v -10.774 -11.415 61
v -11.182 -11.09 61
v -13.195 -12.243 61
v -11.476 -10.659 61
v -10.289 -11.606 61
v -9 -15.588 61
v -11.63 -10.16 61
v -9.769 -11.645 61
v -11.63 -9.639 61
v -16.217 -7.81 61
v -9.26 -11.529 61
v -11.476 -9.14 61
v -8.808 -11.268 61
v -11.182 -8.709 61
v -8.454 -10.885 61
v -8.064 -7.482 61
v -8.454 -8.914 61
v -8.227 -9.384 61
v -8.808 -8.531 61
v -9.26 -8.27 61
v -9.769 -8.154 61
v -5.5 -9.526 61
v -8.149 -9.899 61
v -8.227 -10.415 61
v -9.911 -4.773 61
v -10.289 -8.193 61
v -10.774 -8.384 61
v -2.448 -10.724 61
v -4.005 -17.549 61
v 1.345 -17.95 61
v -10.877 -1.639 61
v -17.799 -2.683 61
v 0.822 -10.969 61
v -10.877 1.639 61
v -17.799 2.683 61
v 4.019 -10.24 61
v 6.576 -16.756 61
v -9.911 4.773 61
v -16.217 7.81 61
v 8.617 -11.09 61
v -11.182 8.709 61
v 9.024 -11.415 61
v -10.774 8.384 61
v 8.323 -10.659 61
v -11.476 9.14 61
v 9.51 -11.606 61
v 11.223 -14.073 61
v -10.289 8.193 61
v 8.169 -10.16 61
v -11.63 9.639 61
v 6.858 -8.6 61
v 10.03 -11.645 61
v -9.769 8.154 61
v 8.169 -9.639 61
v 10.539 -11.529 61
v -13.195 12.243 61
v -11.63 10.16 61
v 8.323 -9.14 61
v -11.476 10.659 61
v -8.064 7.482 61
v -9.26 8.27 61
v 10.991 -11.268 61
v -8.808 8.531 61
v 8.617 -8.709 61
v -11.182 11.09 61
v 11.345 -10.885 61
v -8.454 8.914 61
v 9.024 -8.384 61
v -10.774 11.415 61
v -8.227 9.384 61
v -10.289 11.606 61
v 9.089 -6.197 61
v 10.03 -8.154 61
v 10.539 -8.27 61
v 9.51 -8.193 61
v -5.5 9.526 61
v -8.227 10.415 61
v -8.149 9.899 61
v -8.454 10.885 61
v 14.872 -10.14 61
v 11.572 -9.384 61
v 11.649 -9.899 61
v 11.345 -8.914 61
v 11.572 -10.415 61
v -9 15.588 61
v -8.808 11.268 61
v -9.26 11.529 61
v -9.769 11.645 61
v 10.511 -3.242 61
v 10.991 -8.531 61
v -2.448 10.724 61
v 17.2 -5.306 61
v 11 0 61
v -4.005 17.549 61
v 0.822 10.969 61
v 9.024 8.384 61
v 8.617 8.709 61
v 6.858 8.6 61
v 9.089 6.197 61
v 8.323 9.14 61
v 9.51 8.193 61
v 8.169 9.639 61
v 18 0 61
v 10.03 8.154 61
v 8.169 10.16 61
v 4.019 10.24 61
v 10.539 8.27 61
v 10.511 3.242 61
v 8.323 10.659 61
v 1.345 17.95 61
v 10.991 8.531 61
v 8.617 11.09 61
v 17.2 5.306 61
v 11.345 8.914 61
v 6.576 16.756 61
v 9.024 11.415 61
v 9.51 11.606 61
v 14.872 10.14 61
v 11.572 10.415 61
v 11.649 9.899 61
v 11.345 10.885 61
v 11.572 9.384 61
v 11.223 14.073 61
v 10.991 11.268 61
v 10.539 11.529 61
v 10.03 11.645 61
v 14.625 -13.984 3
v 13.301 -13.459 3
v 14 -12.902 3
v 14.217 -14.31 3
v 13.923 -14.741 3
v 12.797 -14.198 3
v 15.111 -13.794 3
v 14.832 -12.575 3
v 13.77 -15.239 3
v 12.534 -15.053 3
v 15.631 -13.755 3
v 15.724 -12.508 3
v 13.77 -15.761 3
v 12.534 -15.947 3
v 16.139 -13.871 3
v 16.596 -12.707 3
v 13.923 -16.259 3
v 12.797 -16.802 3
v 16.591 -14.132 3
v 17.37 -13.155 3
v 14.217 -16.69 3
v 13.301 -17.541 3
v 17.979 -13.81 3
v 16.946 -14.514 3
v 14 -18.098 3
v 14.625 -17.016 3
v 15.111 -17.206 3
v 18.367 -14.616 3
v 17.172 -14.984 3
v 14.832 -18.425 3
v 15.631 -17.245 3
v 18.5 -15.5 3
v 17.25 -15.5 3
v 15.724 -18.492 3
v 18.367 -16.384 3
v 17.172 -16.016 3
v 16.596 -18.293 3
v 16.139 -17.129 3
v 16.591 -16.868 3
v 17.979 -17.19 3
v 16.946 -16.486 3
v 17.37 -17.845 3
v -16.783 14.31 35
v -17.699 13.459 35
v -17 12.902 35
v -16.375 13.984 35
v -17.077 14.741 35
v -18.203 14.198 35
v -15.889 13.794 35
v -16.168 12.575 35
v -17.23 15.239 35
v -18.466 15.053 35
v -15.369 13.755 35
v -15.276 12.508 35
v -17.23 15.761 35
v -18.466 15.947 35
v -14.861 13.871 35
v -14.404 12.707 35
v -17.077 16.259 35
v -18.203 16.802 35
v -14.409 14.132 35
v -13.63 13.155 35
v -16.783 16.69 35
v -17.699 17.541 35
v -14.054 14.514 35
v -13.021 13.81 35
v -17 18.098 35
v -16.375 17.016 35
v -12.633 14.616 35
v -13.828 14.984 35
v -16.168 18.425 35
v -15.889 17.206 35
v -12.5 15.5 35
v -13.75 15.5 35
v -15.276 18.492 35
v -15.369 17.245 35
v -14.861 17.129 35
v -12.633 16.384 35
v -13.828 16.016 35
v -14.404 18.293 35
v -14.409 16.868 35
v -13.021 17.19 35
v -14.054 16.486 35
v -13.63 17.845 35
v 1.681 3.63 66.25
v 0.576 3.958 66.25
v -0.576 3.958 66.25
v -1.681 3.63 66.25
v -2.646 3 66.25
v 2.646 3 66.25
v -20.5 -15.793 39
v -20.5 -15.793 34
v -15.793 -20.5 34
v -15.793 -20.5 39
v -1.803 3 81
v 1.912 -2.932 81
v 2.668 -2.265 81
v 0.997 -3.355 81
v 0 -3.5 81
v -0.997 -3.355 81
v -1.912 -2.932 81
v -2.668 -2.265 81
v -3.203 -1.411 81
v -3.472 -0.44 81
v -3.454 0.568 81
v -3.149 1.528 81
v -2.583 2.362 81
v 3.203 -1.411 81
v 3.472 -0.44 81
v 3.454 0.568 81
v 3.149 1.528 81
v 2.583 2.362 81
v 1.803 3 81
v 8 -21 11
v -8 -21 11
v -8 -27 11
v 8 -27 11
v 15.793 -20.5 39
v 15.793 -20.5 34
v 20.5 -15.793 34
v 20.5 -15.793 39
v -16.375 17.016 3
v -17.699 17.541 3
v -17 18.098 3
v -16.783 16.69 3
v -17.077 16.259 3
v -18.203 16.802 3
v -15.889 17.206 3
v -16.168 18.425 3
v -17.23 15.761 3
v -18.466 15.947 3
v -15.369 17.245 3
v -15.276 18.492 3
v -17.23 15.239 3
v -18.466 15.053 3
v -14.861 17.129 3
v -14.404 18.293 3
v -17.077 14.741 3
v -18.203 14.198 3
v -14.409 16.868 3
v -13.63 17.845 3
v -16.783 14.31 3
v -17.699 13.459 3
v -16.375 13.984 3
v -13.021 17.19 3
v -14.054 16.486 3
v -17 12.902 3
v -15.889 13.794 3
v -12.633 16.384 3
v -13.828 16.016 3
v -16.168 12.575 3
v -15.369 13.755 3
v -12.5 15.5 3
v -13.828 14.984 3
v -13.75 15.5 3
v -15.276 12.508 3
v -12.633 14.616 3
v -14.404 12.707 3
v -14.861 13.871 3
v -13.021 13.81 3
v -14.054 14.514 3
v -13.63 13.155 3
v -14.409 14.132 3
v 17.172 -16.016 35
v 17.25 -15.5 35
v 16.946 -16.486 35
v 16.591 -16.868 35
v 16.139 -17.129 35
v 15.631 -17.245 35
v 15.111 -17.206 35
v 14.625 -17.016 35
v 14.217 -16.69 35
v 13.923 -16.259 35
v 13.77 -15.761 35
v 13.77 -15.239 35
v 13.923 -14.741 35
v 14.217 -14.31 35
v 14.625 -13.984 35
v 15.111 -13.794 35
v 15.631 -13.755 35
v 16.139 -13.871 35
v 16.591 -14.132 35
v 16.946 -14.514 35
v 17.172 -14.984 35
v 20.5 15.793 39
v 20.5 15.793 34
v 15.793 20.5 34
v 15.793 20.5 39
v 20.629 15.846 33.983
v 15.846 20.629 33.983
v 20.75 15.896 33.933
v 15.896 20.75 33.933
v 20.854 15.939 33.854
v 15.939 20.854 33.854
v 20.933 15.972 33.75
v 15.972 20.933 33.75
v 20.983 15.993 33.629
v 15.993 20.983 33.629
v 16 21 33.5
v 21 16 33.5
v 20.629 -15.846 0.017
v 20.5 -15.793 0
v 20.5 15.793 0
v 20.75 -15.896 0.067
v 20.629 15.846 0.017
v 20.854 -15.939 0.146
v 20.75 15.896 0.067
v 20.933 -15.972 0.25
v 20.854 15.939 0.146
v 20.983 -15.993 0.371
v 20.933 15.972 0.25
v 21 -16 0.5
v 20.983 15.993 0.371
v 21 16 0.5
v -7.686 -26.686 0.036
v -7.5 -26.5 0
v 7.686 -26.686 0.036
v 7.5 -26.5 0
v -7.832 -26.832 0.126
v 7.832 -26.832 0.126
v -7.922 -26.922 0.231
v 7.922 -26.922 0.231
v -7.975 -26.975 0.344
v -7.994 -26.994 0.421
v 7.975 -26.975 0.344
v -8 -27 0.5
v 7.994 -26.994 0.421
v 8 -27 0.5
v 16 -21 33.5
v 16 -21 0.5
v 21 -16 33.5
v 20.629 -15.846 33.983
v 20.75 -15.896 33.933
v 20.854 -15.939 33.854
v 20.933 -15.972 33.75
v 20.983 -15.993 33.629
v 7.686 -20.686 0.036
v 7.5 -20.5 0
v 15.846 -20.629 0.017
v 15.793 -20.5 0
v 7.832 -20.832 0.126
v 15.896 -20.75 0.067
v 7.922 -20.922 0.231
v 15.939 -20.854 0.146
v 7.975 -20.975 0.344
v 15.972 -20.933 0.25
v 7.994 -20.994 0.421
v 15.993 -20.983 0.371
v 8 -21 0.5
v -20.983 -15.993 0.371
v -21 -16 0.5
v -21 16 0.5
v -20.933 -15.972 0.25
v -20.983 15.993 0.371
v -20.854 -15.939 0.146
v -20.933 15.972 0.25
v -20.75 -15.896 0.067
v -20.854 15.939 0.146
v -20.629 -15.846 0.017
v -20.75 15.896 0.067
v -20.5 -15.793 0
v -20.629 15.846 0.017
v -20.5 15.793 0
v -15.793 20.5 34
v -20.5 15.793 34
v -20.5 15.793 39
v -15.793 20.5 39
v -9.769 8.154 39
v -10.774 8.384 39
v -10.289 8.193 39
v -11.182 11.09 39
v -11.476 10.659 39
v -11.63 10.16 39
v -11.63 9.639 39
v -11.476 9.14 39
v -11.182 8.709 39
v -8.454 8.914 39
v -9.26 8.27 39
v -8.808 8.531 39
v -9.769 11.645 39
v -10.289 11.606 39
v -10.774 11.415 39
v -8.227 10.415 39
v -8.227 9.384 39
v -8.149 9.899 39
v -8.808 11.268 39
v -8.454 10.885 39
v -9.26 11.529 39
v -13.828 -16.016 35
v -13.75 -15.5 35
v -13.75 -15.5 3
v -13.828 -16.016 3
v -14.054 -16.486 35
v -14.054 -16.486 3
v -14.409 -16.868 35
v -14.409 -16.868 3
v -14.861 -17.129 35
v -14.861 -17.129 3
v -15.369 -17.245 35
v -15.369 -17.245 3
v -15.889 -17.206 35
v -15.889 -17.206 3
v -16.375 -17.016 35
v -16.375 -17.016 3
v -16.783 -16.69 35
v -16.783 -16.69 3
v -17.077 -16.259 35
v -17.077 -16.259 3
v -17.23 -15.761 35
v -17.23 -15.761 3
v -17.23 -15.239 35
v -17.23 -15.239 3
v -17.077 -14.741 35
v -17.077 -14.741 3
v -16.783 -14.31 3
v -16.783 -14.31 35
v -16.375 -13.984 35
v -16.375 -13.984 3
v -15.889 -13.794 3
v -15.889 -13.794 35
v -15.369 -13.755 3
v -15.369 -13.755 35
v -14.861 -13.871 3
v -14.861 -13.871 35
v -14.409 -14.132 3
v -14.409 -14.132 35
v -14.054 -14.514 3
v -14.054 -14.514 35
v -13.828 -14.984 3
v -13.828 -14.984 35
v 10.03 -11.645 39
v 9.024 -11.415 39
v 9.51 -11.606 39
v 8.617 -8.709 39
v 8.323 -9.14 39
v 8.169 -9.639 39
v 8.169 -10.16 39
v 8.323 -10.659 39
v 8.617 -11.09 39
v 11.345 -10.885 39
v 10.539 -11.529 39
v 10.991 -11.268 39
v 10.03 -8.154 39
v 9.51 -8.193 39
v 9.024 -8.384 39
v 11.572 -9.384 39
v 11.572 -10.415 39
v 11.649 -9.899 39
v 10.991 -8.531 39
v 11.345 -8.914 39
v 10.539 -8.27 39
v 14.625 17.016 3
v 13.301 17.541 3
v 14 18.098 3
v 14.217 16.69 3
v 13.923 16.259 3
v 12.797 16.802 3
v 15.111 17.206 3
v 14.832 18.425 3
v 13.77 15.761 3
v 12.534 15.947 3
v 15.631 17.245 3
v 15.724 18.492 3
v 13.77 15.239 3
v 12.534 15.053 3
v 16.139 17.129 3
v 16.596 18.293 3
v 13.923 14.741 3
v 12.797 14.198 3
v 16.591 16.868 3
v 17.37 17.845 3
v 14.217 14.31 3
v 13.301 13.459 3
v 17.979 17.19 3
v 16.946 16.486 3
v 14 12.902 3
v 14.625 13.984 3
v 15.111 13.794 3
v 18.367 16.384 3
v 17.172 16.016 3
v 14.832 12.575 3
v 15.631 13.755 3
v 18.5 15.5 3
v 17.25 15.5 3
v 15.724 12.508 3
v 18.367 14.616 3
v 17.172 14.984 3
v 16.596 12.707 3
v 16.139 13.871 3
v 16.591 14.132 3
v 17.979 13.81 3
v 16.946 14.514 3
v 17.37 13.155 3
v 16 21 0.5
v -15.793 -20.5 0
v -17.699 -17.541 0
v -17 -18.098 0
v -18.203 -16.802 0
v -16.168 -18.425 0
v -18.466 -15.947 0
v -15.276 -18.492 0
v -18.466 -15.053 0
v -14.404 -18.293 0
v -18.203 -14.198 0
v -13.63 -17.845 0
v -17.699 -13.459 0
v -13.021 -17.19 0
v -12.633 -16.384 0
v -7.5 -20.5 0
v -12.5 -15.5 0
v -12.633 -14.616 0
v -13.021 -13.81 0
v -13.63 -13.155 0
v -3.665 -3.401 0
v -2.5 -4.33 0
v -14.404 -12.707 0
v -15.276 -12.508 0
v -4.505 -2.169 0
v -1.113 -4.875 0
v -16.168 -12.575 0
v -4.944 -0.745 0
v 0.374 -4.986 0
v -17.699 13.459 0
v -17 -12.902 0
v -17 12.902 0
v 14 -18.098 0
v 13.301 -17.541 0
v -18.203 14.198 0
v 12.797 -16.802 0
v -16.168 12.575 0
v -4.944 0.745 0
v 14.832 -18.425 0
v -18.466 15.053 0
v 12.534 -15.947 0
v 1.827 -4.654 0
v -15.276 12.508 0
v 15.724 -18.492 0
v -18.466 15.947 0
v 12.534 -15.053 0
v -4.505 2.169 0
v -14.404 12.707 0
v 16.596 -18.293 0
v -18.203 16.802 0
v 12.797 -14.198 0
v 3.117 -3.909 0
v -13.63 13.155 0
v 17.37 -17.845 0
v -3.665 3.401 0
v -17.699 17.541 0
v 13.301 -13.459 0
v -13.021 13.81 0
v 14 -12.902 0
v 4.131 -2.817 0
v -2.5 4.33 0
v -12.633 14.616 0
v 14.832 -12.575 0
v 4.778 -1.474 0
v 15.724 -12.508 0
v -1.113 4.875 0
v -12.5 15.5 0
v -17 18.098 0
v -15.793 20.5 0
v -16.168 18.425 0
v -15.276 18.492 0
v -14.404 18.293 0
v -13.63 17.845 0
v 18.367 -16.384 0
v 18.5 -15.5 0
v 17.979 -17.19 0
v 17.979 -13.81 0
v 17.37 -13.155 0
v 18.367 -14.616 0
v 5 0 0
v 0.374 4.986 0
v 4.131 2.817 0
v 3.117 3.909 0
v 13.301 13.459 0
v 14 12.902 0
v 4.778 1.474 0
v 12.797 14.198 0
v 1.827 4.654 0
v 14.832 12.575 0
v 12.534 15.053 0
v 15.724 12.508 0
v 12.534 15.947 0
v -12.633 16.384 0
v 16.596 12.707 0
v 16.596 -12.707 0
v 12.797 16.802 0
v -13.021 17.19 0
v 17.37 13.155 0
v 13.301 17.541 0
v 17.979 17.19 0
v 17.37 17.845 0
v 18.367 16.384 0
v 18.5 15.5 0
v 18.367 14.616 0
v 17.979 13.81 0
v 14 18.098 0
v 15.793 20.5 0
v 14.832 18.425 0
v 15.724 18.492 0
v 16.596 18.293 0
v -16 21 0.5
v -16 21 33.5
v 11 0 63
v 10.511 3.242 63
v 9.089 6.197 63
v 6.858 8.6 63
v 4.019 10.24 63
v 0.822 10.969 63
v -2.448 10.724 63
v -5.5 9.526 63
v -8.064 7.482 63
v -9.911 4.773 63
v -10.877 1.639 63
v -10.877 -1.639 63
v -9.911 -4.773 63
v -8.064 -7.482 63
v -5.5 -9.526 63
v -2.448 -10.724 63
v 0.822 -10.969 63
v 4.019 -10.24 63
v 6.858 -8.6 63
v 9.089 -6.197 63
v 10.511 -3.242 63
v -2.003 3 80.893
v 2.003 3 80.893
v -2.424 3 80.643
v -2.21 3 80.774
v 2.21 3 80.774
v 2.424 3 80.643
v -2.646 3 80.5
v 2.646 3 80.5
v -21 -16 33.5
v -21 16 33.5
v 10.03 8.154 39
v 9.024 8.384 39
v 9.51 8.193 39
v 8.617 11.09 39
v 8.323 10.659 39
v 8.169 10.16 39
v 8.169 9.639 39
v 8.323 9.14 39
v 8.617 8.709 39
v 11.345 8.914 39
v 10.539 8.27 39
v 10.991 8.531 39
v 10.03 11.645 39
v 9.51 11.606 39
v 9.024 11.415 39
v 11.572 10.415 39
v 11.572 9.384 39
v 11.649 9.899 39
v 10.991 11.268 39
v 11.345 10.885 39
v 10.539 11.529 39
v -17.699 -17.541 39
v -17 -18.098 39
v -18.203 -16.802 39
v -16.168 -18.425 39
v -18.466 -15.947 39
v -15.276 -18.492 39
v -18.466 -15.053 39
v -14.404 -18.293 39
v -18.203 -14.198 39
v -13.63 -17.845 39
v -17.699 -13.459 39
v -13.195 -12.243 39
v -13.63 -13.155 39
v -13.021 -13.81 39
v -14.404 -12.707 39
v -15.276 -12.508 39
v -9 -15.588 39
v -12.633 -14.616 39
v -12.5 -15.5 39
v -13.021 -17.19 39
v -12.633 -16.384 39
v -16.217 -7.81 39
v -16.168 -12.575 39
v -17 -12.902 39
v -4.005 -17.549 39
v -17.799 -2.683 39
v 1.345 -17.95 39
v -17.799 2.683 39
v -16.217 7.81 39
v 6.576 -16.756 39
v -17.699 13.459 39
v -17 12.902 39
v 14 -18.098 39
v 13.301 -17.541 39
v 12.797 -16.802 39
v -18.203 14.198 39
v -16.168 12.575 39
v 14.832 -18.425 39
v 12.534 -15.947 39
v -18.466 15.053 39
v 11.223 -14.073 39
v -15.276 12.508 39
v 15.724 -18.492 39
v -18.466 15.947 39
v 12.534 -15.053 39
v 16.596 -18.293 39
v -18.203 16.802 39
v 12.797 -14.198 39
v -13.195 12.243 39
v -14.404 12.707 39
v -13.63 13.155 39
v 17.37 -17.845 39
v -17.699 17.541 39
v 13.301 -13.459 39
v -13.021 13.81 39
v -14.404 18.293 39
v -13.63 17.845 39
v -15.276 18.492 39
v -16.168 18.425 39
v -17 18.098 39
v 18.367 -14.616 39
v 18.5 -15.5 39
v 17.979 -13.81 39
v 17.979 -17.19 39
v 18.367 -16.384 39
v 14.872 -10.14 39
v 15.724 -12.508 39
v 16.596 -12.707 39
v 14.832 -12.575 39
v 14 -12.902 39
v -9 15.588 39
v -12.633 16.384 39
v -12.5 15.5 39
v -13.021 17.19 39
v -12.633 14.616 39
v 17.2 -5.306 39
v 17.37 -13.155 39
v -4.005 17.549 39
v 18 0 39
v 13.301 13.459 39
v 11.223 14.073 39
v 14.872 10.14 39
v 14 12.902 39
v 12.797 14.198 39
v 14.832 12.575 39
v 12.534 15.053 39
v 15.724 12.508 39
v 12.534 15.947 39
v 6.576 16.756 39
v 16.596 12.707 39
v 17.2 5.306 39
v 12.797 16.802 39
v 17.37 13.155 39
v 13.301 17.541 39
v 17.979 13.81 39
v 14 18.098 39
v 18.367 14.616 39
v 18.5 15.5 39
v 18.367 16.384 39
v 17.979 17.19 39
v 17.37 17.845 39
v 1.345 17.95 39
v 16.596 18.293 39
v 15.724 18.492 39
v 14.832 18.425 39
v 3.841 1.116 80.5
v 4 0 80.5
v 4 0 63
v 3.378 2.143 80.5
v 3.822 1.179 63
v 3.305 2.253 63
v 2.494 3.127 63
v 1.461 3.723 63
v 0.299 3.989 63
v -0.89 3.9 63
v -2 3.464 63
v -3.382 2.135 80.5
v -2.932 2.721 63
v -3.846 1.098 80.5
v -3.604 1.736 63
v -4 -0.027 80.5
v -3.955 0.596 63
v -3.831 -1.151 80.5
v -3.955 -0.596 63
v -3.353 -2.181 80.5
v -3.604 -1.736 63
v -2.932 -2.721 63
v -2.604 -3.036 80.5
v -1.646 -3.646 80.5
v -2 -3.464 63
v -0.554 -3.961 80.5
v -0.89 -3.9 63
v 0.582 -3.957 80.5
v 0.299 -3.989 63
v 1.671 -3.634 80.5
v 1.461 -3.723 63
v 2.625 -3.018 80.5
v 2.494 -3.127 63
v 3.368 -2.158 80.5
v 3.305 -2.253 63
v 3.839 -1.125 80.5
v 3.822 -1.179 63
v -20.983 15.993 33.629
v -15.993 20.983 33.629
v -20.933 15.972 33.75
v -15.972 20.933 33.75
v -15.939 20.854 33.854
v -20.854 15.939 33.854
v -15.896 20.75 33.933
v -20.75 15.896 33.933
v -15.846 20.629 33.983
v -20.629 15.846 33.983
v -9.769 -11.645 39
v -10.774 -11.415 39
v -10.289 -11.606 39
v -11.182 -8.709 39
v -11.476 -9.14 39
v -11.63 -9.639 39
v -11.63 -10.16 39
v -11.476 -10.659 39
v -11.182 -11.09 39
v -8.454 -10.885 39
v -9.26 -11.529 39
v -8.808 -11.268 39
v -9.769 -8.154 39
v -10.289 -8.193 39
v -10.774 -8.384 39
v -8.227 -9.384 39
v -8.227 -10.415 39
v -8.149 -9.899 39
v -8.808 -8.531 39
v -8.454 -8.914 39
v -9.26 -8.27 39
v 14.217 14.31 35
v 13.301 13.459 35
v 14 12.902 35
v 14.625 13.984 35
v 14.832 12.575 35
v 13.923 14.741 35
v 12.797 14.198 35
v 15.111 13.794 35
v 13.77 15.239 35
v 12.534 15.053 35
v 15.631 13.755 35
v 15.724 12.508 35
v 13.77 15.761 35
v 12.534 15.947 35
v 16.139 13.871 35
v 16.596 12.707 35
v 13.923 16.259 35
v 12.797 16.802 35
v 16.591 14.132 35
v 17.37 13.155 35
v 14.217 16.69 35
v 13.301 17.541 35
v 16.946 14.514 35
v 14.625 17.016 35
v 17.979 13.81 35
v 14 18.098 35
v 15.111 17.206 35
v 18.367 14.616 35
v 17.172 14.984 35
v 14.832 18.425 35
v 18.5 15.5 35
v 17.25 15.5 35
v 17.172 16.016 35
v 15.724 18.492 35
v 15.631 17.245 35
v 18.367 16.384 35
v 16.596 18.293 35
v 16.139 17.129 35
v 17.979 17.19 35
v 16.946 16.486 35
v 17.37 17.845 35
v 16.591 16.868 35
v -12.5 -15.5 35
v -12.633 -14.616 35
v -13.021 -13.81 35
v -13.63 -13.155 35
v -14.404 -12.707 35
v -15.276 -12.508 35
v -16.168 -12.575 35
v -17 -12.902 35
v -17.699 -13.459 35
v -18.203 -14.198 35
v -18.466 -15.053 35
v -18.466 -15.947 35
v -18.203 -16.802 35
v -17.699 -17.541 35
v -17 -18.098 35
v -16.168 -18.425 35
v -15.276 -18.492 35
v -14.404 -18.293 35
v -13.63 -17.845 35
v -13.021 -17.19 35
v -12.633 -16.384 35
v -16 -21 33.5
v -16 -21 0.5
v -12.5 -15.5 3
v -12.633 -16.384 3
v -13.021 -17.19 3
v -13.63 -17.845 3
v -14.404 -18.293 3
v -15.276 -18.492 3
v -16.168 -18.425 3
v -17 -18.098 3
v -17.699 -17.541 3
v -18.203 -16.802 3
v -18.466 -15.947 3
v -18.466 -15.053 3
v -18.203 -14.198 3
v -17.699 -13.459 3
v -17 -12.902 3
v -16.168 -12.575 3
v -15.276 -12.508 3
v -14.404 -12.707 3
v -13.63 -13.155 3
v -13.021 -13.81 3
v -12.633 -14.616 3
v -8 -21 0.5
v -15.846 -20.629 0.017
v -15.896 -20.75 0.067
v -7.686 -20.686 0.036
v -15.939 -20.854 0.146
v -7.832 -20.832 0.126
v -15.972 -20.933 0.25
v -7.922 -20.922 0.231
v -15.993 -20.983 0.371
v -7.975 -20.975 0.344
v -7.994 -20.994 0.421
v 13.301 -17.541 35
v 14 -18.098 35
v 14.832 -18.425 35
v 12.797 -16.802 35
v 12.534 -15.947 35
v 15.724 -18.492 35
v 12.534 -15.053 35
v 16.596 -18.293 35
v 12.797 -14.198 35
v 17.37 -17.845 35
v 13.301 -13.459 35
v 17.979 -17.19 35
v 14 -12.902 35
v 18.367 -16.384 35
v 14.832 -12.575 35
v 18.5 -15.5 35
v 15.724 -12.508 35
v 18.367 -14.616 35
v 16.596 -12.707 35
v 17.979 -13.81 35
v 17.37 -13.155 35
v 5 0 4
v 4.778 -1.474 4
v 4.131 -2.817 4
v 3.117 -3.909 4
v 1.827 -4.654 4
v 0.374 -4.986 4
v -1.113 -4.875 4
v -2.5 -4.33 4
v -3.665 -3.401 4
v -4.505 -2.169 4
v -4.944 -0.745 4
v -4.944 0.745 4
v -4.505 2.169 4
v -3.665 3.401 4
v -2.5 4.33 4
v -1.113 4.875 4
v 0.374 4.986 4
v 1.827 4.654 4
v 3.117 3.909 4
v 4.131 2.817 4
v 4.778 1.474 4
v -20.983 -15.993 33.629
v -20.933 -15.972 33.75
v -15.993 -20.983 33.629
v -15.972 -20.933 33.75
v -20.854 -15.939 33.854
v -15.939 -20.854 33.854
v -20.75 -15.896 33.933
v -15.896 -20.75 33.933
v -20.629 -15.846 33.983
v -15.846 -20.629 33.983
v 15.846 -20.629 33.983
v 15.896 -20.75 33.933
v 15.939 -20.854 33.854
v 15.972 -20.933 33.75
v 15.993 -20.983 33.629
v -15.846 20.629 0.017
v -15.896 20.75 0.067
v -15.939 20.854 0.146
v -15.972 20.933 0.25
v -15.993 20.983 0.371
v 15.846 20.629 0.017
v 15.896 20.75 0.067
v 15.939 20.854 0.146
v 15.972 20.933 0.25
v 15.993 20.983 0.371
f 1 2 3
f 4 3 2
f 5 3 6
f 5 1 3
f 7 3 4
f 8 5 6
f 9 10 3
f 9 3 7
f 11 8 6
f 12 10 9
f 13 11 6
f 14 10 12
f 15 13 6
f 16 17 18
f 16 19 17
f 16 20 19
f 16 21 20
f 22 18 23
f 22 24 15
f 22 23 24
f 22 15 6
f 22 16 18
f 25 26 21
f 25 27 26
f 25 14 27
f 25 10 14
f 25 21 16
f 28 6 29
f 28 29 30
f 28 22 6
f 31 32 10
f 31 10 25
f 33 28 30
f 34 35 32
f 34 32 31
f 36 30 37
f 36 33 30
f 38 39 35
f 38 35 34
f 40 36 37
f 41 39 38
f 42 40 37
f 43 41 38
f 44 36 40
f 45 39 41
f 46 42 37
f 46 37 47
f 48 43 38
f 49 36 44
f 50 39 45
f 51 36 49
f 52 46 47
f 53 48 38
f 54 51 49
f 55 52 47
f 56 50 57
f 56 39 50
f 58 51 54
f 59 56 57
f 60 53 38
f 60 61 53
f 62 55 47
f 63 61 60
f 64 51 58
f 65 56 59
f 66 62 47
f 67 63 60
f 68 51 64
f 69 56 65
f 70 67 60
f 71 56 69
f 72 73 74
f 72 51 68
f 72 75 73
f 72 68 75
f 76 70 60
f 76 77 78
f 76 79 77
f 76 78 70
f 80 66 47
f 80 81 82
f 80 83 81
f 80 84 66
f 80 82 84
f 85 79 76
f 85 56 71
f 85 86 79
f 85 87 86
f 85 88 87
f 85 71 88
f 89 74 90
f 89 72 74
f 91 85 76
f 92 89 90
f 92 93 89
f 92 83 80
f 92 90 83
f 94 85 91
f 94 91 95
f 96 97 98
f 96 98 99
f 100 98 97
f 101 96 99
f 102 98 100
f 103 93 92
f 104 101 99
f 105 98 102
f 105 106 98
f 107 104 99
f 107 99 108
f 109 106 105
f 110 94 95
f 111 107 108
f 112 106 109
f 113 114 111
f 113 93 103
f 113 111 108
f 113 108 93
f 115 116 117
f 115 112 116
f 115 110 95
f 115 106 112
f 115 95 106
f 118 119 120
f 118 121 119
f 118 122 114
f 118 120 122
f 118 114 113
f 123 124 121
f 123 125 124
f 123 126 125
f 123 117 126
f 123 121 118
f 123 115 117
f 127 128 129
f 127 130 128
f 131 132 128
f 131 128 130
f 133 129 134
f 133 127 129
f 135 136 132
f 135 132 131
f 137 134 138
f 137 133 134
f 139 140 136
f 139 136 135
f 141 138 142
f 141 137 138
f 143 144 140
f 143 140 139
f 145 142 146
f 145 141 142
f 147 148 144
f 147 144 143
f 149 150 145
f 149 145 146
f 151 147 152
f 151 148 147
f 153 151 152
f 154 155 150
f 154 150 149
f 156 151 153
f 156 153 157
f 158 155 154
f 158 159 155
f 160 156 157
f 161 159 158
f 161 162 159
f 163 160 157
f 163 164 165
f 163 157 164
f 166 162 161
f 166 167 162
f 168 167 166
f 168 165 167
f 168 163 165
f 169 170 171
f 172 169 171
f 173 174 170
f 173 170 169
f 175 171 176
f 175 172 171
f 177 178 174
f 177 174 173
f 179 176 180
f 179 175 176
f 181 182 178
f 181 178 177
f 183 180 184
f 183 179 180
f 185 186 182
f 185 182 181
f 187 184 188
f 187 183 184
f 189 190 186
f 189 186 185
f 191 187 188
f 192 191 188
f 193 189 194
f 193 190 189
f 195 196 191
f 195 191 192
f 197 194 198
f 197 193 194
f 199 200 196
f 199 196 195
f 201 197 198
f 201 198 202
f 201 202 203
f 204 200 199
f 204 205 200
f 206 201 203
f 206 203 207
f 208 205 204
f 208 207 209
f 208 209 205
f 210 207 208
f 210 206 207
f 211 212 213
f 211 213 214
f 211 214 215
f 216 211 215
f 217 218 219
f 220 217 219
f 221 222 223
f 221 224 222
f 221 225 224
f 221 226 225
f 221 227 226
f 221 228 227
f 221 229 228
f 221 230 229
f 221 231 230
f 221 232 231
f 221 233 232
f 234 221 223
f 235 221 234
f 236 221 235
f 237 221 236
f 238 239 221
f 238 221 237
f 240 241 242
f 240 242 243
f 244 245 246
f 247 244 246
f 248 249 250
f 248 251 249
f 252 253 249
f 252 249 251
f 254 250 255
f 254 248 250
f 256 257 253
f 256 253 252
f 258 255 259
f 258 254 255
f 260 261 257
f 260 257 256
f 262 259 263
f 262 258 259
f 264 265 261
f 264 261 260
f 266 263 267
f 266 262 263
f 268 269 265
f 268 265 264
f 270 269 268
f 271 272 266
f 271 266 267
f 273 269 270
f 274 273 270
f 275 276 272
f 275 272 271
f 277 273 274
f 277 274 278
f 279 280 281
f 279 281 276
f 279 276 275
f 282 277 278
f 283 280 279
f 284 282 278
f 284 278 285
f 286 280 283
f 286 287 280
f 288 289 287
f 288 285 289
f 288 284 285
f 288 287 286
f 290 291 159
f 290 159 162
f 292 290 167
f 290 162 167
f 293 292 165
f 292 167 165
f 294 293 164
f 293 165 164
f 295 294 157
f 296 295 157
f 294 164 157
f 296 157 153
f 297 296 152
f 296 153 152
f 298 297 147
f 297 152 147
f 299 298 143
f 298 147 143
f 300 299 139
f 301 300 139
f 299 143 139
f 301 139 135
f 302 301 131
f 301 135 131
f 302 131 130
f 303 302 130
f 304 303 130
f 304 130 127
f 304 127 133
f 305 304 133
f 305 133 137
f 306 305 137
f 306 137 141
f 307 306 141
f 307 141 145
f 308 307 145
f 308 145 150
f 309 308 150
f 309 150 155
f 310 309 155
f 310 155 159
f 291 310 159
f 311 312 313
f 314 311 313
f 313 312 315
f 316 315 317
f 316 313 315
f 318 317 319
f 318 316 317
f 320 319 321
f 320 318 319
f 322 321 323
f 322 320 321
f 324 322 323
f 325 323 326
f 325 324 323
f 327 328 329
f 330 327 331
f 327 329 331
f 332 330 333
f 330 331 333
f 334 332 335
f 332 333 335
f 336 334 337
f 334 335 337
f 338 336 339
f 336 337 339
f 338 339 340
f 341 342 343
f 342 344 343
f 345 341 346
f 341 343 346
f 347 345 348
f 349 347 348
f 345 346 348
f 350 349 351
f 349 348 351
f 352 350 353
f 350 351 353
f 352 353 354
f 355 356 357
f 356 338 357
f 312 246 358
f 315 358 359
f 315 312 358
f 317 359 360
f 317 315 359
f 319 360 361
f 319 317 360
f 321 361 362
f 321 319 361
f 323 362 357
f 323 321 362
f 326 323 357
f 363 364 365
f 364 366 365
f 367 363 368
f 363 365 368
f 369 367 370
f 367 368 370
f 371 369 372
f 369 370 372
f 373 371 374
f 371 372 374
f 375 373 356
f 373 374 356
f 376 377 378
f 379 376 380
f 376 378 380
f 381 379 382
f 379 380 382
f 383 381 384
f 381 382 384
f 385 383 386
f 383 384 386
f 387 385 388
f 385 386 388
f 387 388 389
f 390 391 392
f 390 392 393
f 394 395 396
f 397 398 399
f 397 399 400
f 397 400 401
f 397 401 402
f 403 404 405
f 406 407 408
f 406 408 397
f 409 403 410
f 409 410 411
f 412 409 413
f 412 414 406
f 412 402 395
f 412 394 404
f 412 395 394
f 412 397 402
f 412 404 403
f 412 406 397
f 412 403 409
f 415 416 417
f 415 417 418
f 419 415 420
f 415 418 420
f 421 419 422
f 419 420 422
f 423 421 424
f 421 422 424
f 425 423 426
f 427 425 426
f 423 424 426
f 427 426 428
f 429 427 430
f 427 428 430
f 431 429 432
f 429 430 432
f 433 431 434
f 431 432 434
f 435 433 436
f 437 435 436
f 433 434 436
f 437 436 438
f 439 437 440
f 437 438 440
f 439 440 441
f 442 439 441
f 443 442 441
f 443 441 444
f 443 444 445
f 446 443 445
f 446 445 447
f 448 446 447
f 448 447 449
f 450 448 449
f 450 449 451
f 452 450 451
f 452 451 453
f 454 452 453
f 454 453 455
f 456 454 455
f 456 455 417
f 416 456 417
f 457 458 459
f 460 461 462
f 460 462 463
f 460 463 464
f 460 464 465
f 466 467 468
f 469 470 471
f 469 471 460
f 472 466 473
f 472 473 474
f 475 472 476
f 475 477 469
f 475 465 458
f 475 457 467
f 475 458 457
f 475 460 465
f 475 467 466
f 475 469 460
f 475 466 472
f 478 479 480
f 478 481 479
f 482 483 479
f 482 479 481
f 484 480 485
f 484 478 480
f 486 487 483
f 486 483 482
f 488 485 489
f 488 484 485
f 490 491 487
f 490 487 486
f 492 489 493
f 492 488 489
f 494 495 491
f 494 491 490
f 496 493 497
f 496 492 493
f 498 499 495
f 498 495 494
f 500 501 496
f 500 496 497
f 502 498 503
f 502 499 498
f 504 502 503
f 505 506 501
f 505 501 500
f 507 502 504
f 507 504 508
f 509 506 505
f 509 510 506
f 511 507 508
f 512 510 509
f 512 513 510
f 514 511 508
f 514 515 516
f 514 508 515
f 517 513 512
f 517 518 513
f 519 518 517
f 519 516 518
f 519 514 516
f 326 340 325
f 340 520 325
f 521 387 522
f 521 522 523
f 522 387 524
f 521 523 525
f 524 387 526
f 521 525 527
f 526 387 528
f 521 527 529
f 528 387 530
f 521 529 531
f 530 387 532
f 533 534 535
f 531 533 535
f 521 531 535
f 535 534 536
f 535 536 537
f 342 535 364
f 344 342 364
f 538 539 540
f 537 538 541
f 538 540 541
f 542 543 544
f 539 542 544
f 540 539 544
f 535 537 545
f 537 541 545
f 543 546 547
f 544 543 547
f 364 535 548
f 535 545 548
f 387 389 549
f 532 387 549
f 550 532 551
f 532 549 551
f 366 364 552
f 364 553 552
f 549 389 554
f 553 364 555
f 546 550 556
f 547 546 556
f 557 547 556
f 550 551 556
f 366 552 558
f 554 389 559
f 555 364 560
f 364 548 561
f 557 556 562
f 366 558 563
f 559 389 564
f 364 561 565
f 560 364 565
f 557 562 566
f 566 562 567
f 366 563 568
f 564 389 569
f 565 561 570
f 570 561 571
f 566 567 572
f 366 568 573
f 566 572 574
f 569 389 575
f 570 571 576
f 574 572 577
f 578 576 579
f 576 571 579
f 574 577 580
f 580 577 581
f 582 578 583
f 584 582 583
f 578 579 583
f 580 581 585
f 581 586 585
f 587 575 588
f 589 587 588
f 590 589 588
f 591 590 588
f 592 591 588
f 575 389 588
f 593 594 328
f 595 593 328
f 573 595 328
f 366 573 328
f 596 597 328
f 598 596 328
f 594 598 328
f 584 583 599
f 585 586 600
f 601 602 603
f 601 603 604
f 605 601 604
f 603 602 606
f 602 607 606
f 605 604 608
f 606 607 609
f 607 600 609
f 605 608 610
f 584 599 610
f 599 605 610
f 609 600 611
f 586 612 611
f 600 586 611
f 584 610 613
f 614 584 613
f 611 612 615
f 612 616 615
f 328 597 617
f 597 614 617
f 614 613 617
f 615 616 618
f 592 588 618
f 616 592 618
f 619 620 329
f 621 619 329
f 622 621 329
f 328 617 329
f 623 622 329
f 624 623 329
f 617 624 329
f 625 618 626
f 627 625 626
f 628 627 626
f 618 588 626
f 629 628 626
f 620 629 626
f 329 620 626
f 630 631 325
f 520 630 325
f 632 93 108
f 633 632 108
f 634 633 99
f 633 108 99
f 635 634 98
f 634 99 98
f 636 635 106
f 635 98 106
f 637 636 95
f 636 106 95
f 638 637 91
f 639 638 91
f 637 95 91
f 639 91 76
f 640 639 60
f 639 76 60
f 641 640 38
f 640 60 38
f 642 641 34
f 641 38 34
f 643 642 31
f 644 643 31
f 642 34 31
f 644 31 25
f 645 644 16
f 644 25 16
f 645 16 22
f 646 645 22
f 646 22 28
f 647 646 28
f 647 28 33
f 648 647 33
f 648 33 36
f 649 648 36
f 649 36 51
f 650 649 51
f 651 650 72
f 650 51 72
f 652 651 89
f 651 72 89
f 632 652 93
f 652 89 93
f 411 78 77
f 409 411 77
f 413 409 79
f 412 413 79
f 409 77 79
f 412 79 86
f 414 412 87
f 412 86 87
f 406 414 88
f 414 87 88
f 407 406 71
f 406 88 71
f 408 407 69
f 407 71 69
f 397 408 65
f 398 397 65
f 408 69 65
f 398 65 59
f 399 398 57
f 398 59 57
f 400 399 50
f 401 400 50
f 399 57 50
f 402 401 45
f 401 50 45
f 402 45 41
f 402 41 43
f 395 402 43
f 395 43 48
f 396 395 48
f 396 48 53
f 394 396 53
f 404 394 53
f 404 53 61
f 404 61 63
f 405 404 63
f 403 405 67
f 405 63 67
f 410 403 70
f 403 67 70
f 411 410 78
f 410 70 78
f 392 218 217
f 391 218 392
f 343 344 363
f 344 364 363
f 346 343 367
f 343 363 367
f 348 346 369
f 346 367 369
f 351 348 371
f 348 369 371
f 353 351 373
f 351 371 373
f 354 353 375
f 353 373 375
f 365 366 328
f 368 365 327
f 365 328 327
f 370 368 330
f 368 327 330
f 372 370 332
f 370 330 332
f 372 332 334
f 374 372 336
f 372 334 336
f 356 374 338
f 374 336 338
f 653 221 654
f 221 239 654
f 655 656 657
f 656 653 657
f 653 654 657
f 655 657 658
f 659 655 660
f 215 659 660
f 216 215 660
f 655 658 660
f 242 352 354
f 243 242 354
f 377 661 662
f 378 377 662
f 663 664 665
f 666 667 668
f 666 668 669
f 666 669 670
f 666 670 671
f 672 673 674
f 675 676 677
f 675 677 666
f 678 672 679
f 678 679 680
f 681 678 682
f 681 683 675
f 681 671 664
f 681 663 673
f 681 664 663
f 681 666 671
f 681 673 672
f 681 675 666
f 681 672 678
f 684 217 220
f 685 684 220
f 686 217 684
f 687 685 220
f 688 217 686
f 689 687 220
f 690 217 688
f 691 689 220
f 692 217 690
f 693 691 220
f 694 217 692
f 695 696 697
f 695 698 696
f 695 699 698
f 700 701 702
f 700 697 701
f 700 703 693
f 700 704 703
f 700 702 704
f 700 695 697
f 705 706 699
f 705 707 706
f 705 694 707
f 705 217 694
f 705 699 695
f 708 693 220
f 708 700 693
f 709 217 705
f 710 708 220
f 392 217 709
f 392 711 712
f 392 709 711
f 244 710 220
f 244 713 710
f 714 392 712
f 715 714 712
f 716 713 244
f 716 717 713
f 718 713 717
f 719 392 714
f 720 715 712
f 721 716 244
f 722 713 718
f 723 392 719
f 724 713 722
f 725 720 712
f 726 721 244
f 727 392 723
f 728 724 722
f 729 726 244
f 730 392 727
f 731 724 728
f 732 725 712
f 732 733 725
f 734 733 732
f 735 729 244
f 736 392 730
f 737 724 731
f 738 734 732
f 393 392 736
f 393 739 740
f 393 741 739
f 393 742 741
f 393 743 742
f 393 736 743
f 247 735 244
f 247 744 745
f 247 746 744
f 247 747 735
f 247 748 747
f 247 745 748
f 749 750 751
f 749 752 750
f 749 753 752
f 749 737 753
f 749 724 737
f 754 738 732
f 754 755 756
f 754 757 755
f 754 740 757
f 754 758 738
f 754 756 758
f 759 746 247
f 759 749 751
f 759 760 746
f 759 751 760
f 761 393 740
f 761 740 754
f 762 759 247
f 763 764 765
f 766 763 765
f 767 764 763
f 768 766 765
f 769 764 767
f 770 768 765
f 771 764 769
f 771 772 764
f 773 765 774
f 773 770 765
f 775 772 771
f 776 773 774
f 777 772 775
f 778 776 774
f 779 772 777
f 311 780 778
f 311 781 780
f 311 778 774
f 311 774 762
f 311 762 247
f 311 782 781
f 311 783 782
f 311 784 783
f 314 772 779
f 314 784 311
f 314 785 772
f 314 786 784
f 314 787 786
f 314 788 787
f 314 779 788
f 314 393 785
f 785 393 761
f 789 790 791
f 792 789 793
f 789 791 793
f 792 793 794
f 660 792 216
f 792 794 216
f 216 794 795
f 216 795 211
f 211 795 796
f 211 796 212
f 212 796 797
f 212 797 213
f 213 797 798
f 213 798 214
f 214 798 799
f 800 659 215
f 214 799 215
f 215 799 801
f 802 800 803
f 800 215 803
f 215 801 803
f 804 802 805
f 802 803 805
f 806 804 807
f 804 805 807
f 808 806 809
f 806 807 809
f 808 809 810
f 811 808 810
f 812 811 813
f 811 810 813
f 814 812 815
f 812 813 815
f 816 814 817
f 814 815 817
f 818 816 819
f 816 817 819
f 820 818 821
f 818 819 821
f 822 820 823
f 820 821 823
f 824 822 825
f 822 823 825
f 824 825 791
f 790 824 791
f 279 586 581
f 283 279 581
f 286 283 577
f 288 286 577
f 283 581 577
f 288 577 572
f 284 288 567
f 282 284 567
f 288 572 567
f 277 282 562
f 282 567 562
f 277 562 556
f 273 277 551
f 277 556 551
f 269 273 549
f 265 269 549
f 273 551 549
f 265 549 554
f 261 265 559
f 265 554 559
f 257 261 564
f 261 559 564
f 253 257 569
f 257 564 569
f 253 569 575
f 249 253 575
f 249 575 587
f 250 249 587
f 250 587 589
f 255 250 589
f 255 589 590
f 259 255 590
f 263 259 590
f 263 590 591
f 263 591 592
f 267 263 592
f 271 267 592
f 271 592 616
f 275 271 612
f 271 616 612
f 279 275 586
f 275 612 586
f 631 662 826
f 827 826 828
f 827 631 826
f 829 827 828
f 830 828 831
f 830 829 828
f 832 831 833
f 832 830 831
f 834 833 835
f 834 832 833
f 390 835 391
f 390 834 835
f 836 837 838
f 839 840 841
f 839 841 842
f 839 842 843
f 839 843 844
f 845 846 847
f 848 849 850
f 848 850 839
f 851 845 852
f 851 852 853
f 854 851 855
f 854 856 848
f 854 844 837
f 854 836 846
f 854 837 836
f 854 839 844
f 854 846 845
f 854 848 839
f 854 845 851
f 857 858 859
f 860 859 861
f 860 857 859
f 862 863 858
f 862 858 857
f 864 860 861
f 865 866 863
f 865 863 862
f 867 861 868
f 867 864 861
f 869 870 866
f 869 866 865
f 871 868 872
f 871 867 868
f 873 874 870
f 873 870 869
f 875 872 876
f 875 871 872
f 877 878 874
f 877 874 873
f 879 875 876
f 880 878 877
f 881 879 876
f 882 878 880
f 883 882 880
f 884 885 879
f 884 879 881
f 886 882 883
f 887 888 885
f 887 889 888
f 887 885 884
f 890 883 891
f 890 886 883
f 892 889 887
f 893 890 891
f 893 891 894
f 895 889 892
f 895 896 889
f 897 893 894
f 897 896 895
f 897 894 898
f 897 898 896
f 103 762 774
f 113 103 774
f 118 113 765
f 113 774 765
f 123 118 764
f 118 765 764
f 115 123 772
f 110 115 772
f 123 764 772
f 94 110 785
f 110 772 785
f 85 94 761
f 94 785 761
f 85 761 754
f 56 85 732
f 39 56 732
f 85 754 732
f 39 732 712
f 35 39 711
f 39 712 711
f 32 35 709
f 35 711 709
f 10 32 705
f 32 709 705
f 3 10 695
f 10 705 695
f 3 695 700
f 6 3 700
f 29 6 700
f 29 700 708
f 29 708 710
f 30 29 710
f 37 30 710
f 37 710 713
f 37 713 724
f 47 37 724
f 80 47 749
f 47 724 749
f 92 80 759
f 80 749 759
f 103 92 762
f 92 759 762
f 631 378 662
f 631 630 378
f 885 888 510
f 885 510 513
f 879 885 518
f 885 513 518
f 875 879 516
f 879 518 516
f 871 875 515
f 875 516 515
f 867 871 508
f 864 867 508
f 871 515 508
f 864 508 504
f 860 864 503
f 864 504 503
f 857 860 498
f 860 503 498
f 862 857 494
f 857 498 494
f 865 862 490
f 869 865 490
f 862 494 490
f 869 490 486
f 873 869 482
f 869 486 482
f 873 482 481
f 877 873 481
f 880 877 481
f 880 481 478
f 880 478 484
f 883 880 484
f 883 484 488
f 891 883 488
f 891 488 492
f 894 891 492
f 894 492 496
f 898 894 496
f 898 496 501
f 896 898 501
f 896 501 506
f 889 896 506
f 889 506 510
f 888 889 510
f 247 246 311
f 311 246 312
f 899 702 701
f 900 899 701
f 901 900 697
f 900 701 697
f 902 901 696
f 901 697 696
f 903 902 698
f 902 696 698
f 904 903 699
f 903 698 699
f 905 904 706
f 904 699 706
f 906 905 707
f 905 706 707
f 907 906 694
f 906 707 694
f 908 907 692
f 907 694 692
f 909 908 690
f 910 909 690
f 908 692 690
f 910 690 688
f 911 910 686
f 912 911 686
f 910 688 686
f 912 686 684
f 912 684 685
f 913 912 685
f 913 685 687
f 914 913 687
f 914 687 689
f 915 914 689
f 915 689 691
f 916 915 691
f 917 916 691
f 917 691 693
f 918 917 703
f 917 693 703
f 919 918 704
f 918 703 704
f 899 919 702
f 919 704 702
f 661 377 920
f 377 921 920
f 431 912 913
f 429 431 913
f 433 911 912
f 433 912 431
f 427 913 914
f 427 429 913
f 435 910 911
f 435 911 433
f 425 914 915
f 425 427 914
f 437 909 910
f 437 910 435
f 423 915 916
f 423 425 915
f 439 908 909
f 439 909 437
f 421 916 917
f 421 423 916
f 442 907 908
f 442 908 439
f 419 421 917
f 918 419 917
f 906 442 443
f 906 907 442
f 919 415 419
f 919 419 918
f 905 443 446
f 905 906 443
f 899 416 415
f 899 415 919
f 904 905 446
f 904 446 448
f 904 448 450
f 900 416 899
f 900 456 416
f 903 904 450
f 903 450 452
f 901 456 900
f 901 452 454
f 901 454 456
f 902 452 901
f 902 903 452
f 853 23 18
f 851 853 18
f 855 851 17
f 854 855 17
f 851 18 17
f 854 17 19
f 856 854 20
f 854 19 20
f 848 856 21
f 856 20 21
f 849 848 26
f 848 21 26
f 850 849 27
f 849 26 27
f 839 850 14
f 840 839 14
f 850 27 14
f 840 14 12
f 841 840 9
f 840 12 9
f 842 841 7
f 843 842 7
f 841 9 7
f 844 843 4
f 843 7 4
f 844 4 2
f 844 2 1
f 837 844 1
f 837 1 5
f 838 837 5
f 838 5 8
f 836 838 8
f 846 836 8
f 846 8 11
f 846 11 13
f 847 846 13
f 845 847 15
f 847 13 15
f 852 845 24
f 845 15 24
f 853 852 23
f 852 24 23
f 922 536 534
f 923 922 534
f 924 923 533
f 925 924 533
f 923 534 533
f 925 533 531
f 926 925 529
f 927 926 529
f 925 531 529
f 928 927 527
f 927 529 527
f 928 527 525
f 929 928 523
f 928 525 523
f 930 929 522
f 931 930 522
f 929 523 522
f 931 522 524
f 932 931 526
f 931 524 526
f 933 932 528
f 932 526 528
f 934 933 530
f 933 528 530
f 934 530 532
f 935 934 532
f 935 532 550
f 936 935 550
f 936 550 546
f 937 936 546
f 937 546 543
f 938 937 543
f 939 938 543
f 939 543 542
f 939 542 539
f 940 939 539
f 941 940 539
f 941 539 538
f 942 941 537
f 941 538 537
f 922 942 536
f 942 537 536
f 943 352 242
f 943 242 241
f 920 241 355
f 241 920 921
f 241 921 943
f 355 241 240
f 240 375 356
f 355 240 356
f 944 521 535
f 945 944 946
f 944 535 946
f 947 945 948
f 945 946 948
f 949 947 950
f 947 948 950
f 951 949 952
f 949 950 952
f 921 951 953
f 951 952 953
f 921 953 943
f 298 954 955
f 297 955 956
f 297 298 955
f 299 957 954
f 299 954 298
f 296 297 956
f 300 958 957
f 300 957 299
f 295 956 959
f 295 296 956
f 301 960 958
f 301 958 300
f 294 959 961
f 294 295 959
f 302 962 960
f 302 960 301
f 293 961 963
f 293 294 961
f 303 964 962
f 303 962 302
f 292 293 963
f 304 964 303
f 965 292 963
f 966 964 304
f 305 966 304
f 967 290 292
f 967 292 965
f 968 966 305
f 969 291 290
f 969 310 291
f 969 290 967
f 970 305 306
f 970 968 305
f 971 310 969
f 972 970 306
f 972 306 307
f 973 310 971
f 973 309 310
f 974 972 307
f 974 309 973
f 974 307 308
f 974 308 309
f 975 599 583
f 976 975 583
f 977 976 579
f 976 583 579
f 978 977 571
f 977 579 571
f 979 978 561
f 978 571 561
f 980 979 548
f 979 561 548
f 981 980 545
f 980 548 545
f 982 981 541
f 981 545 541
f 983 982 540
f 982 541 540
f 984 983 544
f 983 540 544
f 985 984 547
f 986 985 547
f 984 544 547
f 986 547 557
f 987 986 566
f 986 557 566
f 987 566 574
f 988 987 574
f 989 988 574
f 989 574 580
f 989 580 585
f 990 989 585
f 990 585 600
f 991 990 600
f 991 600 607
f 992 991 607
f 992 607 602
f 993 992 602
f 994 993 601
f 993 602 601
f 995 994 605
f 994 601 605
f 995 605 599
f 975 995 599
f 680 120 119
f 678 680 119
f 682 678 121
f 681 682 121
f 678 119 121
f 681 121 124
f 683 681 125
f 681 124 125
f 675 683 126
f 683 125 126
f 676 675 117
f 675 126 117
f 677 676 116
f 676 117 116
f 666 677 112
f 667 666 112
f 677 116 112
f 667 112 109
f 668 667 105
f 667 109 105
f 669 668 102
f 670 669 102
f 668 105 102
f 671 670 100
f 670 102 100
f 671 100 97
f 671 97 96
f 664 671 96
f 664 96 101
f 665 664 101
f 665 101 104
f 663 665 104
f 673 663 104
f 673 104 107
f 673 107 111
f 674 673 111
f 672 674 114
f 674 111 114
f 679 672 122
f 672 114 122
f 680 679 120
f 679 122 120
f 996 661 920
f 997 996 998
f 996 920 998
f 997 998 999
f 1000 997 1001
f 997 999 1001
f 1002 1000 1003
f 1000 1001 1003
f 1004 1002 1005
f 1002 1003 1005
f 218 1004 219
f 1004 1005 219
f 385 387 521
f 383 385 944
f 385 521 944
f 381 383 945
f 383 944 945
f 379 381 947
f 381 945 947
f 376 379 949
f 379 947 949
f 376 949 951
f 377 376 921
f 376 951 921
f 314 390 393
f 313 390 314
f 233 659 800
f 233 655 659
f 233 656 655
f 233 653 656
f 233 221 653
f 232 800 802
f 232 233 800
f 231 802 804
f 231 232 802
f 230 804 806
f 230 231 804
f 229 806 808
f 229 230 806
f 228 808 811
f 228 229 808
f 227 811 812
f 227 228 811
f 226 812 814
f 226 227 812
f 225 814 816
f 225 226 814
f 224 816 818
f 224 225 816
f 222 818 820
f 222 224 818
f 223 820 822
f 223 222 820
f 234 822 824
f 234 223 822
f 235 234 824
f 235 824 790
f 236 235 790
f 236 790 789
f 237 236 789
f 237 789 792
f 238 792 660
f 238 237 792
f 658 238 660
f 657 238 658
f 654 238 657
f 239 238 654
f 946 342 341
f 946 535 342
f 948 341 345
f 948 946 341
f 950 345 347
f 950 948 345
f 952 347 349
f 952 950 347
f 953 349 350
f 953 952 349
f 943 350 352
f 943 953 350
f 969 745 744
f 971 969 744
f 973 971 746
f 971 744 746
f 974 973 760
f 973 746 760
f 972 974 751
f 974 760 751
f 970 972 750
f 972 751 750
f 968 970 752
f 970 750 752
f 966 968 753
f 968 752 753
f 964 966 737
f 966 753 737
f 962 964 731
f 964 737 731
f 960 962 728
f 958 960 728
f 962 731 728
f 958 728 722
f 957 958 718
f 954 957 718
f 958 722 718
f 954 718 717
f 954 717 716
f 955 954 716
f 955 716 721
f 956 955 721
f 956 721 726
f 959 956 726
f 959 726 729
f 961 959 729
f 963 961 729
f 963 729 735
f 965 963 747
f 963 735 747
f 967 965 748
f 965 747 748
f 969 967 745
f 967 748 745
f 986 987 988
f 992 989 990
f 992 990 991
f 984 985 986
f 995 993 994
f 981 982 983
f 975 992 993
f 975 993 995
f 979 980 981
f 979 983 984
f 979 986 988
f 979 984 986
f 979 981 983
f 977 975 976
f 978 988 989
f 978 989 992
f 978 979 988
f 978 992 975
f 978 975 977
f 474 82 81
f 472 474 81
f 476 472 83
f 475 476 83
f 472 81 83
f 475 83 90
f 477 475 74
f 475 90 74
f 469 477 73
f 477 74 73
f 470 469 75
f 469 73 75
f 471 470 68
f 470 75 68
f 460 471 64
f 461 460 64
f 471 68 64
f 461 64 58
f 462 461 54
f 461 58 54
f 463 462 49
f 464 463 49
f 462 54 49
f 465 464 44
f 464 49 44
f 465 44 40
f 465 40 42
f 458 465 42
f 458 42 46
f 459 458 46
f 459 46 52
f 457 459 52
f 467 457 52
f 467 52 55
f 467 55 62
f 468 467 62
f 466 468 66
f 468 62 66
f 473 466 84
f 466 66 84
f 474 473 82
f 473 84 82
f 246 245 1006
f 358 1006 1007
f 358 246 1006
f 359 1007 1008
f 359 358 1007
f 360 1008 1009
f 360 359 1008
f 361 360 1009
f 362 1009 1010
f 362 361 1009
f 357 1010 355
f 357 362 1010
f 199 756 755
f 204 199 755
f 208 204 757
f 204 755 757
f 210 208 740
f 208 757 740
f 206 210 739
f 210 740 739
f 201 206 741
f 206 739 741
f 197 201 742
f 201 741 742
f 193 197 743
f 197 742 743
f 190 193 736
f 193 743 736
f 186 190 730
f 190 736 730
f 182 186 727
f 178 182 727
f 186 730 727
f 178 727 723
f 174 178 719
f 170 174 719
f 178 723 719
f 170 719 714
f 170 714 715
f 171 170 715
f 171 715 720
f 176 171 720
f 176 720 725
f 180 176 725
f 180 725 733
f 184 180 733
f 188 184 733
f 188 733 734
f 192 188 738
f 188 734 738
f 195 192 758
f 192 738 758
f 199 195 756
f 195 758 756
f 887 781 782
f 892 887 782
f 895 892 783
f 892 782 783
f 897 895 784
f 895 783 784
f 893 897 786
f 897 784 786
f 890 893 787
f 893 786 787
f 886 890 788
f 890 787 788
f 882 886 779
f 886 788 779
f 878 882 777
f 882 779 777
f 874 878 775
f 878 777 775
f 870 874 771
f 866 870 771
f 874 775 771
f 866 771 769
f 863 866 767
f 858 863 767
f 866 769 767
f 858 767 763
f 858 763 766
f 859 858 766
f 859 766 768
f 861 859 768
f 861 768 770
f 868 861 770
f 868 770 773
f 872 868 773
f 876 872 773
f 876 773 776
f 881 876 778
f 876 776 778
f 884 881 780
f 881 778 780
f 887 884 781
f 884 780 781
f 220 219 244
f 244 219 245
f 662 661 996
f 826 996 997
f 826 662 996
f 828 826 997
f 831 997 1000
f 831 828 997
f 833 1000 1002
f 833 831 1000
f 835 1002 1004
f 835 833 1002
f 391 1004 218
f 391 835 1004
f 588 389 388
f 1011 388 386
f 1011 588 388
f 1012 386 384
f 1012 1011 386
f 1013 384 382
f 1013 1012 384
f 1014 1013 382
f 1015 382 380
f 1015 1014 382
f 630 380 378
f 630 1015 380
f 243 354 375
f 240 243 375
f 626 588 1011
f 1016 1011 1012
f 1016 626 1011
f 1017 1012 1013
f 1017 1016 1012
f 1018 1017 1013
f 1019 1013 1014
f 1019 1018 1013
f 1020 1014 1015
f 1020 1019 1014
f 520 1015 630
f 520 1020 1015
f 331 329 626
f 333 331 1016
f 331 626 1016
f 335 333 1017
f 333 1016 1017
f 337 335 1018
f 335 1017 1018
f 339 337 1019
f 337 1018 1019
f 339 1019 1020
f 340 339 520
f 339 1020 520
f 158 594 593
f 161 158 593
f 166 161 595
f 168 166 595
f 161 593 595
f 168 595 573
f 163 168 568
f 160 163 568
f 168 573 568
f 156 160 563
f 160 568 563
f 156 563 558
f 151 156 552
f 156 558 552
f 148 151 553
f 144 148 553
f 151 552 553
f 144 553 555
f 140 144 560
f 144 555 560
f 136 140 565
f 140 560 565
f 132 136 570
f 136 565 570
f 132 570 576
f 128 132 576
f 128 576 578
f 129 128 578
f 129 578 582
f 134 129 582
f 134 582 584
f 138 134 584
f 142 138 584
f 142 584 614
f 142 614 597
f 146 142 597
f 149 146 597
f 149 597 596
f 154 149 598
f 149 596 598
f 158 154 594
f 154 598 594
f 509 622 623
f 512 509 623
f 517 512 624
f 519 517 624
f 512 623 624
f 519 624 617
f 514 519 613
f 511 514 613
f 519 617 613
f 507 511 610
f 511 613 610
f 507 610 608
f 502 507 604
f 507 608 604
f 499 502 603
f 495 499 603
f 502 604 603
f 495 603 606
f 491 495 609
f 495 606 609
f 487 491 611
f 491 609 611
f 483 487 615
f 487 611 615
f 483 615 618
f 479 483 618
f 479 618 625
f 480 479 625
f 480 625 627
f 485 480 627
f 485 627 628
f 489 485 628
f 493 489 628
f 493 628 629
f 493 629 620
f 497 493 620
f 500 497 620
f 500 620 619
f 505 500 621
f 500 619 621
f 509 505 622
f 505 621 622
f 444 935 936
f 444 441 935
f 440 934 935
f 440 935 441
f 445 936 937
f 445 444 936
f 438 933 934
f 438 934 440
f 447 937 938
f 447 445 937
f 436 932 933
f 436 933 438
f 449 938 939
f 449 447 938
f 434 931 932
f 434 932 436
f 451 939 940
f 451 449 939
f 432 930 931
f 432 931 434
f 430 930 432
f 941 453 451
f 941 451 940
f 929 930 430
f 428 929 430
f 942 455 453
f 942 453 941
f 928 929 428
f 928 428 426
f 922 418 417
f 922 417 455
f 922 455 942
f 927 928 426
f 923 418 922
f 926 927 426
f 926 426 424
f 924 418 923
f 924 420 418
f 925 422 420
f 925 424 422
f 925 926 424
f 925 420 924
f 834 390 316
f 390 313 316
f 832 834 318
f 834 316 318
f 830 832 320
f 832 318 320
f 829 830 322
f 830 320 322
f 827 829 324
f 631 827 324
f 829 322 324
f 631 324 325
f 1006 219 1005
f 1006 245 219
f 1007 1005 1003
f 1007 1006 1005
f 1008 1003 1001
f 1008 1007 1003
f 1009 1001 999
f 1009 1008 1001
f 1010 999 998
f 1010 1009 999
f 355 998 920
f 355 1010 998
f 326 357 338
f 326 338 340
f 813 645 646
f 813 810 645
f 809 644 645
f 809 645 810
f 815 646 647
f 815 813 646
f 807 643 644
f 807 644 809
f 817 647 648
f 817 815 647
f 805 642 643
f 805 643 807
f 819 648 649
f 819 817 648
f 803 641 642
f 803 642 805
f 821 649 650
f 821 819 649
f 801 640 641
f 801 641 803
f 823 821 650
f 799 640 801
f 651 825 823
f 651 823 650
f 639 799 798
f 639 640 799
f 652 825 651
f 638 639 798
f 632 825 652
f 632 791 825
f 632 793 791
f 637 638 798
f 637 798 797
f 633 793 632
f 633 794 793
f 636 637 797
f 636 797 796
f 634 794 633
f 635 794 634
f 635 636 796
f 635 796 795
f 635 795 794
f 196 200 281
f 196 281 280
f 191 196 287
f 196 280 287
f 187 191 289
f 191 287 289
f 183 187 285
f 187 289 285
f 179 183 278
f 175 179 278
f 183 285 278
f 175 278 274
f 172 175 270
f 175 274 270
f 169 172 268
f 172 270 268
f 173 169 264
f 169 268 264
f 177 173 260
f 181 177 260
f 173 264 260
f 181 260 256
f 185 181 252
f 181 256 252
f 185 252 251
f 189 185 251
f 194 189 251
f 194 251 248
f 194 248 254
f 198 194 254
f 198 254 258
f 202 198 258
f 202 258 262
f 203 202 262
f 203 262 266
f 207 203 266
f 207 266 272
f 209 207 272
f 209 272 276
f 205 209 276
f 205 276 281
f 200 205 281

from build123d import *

# Parameters (mm, degrees)
F0_W      = 42
F0_H      = 42
F1_DEPTH  = 34
F2_SIZE   = 5
F3_W      = 16
F3_H      = 6
F4_DEPTH  = 11
F5_R      = 0.5
F6_DEPTH  = 5
F7_R      = 1.75
F8_DEPTH  = 39.001
F9_R      = 3
F10_DEPTH = 4
F11_R     = 18
F12_DEPTH = 22
F13_R     = 11
F14_DEPTH = 2
F15_R     = 4
F16_DEPTH = 20
F17_SIZE  = 0.5
F19_DEPTH = 14.75
F20_R     = 1.75
F21_DEPTH = 22
F22_R     = 3
F23_DEPTH = 3
F24_R     = 5
F25_DEPTH = 4


with BuildPart() as f1:
    # F0 (on Top) → F1 (new body)
    with BuildSketch(Plane.XY):
        Rectangle(F0_W, F0_H)
    extrude(amount=F1_DEPTH)

    # F2
    f2_edges = [f1.edges().sort_by_distance(p)[0] for p in [
        (-21, -21, 17),
        (21, -21, 17),
        (21, 21, 17),
        (-21, 21, 17),
    ]]
    chamfer(f2_edges, length=F2_SIZE)

    # F3 (on Top) → F4 (join)
    with BuildSketch(Plane.XY):
        with Locations((0, -24)):
            Rectangle(F3_W, F3_H)
    extrude(amount=F4_DEPTH)

    # F5
    f5_edges = [f1.edges().sort_by_distance(p)[0] for p in [
        (21, 0, 34),
        (18.5, -18.5, 34),
        (18.5, 18.5, 34),
        (0, -21, 34),
        (0, 21, 34),
        (-18.5, -18.5, 34),
        (-18.5, 18.5, 34),
        (-21, 0, 34),
        (21, 0, 0),
        (18.5, 18.5, 0),
        (0, 21, 0),
        (-18.5, 18.5, 0),
        (-21, 0, 0),
        (-18.5, -18.5, 0),
        (-12, -21, 0),
        (-8, -24, 0),
        (0, -27, 0),
        (8, -24, 0),
        (12, -21, 0),
        (18.5, -18.5, 0),
    ]]
    fillet(f5_edges, radius=F5_R)

    # F6 (add): a face of the model
    f6_faces = [f1.faces().sort_by_distance(p)[0] for p in [
        (0, 0, 34),
    ]]
    extrude(f6_faces, amount=F6_DEPTH)

    # F7 (on face) → F8 (cut, through all)
    with BuildSketch(Plane(origin=(0, 0, 0), x_dir=(1, 0, 0), z_dir=(0, 0, -1))):
        with Locations((-15.5, 15.5)):
            Circle(F7_R)
        with Locations((-15.5, -15.5)):
            Circle(F7_R)
        with Locations((15.5, -15.5)):
            Circle(F7_R)
        with Locations((15.5, 15.5)):
            Circle(F7_R)
    extrude(amount=-F8_DEPTH, mode=Mode.SUBTRACT)

    # F9 (on face) → F10 (cut)
    with BuildSketch(Plane.XY.offset(39)):
        with Locations((-15.5, 15.5)):
            Circle(F9_R)
        with Locations((-15.5, -15.5)):
            Circle(F9_R)
        with Locations((15.5, -15.5)):
            Circle(F9_R)
        with Locations((15.5, 15.5)):
            Circle(F9_R)
    extrude(amount=-F10_DEPTH, mode=Mode.SUBTRACT)

    # F11 (on face) → F12 (join)
    with BuildSketch(Plane.XY.offset(39)):
        Circle(F11_R)
    extrude(amount=F12_DEPTH)

    # F13 (on face) → F14 (join)
    with BuildSketch(Plane.XY.offset(61)):
        Circle(F13_R)
    extrude(amount=F14_DEPTH)

    # F15 (on face) → F16 (join)
    with BuildSketch(Plane.XY.offset(61)):
        Circle(F15_R)
    extrude(amount=F16_DEPTH)

    # F17
    f17_edges = [f1.edges().sort_by_distance(p)[0] for p in [
        (-4, 0, 81),
    ]]
    chamfer(f17_edges, length=F17_SIZE)

    # F18 (on face) → F19 (cut)
    with BuildSketch(Plane.XY.offset(81)):
        with BuildLine():
            Line((-2.6457513111, 3), (2.6457513111, 3))
            ThreePointArc((2.6457513111, 3), (0, 4), (-2.6457513111, 3))
        make_face()
    extrude(amount=-F19_DEPTH, mode=Mode.SUBTRACT)

    # F20 (on face) → F21 (cut, through all)
    with BuildSketch(Plane.XY.offset(61)):
        with Locations((-9.8994949366, 9.8994949366)):
            Circle(F20_R)
        with Locations((-9.8994949366, -9.8994949366)):
            Circle(F20_R)
        with Locations((9.8994949366, -9.8994949366)):
            Circle(F20_R)
        with Locations((9.8994949366, 9.8994949366)):
            Circle(F20_R)
    extrude(amount=-F21_DEPTH, mode=Mode.SUBTRACT)

    # F22 (on face) → F23 (cut)
    with BuildSketch(Plane(origin=(0, 0, 0), x_dir=(1, 0, 0), z_dir=(0, 0, -1))):
        with Locations((-15.5, 15.5)):
            Circle(F22_R)
        with Locations((-15.5, -15.5)):
            Circle(F22_R)
        with Locations((15.5, -15.5)):
            Circle(F22_R)
        with Locations((15.5, 15.5)):
            Circle(F22_R)
    extrude(amount=-F23_DEPTH, mode=Mode.SUBTRACT)

    # F24 (on face) → F25 (cut)
    with BuildSketch(Plane(origin=(0, 0, 0), x_dir=(1, 0, 0), z_dir=(0, 0, -1))):
        Circle(F24_R)
    extrude(amount=-F25_DEPTH, mode=Mode.SUBTRACT)


solid = f1.part
